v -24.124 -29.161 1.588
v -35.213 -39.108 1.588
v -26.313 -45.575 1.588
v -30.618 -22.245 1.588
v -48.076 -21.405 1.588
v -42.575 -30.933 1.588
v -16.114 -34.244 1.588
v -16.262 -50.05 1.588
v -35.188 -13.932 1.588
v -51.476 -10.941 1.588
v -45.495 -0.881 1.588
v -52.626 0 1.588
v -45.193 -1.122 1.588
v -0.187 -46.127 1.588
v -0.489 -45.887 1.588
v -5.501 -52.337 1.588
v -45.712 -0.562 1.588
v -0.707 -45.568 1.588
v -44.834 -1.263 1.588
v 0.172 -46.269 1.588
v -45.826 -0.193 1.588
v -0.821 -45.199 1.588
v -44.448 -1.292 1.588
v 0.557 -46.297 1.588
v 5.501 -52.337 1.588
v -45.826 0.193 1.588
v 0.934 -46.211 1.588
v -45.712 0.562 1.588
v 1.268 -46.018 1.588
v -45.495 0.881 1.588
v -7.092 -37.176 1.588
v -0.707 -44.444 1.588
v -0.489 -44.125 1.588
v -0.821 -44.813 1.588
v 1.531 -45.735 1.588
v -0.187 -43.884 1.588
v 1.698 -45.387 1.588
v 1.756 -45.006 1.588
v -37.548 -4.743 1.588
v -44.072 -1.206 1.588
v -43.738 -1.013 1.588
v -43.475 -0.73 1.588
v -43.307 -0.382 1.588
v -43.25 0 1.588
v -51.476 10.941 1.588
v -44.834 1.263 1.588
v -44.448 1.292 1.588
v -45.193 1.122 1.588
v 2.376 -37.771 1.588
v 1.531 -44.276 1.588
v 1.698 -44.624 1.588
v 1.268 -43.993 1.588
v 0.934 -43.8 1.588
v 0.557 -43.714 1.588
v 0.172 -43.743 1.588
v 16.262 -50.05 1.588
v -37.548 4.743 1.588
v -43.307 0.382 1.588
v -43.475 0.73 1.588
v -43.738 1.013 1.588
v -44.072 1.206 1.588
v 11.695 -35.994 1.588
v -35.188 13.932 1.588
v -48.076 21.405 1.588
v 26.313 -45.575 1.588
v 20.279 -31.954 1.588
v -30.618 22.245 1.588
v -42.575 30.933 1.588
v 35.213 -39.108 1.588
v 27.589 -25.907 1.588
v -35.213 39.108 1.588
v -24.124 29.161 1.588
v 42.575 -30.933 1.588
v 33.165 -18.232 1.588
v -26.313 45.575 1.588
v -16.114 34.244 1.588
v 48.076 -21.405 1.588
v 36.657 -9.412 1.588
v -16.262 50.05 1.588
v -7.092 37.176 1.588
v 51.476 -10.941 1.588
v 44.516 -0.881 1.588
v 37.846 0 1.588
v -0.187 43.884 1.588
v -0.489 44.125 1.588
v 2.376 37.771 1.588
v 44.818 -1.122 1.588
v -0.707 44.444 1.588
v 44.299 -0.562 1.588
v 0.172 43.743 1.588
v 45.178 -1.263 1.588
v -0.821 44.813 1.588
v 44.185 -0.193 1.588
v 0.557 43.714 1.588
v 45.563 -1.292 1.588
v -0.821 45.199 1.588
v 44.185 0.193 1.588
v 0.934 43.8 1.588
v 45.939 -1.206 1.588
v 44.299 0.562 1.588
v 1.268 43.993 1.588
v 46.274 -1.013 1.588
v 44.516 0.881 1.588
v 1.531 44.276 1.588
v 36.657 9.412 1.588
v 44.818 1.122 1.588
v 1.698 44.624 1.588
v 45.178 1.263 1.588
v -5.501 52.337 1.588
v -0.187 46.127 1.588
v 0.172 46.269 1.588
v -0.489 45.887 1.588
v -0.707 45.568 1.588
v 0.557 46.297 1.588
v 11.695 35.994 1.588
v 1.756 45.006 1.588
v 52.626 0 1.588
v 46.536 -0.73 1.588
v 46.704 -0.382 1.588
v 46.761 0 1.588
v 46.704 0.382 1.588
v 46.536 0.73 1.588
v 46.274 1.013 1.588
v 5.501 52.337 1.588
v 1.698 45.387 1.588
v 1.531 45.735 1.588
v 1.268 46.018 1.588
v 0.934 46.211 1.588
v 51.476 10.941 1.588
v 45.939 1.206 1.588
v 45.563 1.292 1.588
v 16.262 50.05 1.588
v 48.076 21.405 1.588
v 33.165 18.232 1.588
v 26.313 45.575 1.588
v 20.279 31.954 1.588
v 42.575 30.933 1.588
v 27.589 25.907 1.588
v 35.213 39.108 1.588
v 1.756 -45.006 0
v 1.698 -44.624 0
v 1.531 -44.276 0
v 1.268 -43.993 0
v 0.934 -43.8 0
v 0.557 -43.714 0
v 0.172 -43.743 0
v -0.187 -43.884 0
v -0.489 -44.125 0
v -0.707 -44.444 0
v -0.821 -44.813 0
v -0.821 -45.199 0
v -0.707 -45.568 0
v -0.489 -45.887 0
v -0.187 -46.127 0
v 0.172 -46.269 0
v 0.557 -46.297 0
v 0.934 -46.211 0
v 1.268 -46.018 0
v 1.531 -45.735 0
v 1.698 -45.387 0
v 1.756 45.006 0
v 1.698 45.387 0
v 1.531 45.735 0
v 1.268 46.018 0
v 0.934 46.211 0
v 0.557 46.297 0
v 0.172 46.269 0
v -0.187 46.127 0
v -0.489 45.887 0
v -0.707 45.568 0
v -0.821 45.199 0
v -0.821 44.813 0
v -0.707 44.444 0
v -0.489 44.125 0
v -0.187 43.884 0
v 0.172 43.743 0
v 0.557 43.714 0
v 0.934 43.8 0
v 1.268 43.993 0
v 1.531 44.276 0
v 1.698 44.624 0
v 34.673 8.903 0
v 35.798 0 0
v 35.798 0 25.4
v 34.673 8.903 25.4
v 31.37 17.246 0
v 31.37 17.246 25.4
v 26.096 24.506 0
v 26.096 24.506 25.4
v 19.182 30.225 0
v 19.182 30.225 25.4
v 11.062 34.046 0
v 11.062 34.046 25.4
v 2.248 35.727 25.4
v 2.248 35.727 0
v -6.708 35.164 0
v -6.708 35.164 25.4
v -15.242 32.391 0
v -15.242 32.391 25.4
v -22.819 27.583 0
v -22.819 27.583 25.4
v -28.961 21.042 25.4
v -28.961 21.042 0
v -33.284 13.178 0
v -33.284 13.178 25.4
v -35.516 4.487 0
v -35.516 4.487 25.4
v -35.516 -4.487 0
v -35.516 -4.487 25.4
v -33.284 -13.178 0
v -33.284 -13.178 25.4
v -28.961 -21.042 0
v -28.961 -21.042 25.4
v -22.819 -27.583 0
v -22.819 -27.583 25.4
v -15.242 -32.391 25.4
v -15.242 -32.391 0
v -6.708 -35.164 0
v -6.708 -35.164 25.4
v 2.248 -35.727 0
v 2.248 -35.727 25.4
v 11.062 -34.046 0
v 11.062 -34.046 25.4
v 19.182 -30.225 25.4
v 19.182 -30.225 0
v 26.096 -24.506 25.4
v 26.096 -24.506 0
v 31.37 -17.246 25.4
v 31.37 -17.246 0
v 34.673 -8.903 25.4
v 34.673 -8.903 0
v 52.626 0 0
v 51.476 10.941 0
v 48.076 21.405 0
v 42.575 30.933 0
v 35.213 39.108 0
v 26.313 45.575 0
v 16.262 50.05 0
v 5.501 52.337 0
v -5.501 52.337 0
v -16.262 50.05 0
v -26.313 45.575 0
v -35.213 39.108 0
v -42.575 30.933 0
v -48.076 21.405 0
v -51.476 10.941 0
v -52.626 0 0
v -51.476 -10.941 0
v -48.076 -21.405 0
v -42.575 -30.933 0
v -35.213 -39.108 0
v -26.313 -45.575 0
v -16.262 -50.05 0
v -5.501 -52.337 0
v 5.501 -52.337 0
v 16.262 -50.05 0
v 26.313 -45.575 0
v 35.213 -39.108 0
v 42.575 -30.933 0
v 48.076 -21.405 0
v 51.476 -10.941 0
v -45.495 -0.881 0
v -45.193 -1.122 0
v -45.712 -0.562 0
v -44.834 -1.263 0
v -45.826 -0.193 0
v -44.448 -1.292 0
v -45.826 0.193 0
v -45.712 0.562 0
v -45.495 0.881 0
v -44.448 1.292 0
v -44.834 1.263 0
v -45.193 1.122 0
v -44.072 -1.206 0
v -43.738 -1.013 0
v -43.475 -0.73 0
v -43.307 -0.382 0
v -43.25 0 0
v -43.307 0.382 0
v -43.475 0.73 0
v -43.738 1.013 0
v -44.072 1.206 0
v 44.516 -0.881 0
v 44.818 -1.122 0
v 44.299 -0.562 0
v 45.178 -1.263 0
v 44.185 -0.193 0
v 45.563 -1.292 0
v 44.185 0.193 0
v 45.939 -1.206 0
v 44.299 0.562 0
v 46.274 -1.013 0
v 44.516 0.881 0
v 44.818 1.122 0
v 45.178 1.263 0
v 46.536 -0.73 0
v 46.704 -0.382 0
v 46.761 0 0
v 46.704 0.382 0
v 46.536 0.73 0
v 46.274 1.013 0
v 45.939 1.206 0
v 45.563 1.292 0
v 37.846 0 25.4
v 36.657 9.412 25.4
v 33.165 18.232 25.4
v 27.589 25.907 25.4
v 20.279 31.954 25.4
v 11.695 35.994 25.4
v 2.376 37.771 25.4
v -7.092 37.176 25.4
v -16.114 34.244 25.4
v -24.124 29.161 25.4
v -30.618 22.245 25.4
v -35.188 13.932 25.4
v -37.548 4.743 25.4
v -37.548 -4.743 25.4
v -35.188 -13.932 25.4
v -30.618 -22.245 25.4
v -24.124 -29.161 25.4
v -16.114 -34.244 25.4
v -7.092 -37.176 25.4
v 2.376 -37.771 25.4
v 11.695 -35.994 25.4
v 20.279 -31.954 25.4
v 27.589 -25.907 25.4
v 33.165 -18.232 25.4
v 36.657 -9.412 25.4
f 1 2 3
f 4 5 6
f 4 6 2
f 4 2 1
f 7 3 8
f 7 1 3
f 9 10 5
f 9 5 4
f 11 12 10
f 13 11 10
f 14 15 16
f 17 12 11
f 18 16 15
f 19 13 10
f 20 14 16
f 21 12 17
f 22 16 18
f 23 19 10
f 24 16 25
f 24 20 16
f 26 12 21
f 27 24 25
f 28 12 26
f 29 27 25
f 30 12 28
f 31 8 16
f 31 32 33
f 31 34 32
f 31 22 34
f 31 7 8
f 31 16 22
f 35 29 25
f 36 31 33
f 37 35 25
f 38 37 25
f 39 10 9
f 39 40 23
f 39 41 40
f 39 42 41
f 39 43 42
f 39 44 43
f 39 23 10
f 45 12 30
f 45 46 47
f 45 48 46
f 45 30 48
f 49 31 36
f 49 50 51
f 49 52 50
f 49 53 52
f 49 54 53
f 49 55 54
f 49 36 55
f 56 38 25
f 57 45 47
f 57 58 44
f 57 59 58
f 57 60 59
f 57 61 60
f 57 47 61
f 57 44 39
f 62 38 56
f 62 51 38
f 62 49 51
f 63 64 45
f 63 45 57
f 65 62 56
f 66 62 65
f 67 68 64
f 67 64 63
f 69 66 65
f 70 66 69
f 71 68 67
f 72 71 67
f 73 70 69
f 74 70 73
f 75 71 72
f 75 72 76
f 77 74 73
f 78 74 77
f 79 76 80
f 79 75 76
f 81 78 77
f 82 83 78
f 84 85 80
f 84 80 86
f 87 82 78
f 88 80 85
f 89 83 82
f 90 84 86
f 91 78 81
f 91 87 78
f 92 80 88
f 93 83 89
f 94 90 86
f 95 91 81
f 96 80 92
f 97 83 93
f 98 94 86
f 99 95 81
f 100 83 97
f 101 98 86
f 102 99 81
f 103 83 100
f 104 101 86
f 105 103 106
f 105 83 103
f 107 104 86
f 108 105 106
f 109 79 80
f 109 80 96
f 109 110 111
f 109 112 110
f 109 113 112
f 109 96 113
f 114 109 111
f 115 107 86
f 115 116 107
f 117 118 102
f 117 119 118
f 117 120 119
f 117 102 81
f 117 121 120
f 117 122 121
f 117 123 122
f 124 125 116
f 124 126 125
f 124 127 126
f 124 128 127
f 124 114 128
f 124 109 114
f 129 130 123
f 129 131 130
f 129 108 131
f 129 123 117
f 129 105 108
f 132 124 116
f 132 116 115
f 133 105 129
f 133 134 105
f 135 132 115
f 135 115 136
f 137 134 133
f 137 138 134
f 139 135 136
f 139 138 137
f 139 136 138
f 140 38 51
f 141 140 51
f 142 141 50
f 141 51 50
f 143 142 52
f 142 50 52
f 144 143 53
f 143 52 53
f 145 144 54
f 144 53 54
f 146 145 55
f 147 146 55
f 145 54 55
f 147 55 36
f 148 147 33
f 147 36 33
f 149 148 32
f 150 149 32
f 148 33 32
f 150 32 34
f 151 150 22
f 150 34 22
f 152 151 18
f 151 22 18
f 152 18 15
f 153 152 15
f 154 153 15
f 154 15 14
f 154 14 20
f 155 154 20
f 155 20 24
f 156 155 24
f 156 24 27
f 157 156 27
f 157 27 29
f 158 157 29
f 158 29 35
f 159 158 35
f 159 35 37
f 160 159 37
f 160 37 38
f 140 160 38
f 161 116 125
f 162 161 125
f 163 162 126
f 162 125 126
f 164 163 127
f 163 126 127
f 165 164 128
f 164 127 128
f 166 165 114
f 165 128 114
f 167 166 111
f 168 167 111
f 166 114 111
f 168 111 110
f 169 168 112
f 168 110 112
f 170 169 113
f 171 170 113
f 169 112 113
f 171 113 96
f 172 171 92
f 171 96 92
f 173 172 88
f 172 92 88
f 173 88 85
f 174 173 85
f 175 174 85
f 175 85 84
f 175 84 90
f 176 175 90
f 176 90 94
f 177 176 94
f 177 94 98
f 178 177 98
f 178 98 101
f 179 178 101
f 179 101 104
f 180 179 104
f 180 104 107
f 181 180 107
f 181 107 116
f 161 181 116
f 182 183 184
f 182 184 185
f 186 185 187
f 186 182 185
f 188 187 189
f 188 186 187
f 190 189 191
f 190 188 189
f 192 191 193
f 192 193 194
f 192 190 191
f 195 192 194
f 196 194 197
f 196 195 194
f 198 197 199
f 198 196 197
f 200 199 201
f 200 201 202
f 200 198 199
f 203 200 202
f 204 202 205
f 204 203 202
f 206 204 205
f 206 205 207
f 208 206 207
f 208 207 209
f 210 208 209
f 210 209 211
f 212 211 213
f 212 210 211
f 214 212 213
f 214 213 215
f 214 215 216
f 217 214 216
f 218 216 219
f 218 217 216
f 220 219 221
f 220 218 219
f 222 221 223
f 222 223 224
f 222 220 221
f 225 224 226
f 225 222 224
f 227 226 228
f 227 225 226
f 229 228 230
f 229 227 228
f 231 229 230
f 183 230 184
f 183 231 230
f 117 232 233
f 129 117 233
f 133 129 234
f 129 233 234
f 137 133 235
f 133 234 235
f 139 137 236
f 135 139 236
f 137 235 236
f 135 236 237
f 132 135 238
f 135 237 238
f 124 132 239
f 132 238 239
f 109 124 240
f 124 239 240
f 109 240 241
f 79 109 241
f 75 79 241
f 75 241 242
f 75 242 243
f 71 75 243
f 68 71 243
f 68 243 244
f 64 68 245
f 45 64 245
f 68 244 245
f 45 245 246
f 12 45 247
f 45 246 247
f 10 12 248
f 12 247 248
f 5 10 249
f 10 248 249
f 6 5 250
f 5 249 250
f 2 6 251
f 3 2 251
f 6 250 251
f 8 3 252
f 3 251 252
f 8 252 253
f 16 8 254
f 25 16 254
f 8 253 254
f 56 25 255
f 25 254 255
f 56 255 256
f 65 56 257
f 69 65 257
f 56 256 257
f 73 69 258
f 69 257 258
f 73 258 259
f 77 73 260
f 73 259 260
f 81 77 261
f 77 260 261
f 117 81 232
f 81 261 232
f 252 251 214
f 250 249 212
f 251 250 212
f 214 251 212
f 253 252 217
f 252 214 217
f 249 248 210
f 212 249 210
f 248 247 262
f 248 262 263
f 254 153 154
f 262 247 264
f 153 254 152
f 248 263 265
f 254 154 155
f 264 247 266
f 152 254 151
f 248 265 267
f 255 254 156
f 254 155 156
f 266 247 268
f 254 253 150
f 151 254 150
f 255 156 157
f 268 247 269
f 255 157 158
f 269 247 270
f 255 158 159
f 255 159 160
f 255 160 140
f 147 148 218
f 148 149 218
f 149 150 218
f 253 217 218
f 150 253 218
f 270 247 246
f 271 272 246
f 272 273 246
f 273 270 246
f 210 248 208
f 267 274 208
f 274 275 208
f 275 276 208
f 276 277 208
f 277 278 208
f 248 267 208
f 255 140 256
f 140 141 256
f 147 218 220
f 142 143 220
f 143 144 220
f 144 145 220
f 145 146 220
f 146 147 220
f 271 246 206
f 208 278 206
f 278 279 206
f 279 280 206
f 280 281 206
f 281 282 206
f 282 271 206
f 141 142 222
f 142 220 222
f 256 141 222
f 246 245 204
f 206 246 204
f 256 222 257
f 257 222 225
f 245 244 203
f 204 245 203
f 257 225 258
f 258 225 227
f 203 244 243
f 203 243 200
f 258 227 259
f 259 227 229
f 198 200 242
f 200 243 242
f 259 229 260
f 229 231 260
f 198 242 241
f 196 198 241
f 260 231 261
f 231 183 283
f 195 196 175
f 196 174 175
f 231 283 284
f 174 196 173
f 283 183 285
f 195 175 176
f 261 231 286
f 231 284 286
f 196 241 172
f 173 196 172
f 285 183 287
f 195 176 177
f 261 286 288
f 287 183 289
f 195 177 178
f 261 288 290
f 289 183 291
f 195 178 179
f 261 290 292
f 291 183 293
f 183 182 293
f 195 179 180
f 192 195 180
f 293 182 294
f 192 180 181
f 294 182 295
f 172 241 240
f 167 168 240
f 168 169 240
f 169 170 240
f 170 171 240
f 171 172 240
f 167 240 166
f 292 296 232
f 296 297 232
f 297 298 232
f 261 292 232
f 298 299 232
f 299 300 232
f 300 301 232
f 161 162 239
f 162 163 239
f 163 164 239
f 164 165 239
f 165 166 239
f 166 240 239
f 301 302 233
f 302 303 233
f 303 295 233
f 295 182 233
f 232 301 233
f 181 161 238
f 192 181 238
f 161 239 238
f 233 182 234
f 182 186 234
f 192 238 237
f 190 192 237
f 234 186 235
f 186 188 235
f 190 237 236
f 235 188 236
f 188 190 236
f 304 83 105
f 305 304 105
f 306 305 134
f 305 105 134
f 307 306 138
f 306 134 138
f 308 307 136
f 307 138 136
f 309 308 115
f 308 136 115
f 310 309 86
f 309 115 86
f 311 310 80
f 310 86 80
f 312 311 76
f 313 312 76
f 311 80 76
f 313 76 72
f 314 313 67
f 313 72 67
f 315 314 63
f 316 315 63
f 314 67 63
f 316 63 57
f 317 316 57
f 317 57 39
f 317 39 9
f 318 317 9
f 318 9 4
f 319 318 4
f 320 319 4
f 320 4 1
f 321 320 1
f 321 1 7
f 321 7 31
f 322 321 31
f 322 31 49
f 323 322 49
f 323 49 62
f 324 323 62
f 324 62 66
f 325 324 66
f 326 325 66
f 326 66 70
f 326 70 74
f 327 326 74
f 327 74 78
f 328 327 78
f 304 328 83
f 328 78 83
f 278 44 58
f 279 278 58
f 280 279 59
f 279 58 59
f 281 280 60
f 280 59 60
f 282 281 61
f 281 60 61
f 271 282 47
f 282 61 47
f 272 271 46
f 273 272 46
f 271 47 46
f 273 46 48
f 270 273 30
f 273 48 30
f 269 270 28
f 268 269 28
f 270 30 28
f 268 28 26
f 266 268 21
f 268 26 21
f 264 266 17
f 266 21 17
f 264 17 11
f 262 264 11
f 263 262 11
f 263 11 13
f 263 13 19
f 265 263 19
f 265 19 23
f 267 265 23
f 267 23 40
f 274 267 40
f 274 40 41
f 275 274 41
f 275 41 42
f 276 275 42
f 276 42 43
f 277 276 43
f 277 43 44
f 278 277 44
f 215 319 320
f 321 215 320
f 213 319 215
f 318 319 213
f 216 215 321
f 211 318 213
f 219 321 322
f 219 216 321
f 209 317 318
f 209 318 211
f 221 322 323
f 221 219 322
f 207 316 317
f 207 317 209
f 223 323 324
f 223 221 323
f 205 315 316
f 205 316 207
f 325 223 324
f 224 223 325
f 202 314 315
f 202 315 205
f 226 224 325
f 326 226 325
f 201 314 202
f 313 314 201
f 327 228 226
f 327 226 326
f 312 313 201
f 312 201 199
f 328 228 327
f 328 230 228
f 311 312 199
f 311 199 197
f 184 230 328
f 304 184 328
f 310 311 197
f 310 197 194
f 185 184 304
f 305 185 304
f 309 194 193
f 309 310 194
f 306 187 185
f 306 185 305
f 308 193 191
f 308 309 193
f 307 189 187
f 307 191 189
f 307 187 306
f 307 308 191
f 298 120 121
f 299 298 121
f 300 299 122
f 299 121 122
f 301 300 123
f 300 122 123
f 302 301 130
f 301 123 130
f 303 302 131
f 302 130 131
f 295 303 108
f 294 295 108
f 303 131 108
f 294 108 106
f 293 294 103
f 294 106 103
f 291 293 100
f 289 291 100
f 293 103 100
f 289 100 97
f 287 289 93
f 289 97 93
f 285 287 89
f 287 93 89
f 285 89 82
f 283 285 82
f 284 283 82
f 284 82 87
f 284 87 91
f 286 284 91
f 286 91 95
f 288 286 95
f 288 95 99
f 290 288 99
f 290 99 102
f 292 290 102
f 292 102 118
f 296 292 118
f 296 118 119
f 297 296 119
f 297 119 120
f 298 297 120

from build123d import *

# Parameters (mm, degrees)
F0_R     = 37.846
F1_DEPTH = 25.4
F2_R     = 52.625625
F3_DEPTH = 1.5875
F4_R     = 35.798125
F5_DEPTH = 25.4
F6_R     = 1.2954
F7_DEPTH = 1.5885


with BuildPart() as f1:
    # F0 (on Top) → F1 (new body)
    with BuildSketch(Plane.XY):
        Circle(F0_R)
    extrude(amount=F1_DEPTH)

    # F2 (on Top) → F3 (join)
    with BuildSketch(Plane.XY):
        Circle(F2_R)
    extrude(amount=F3_DEPTH)

    # F4 (on Top) → F5 (cut, through all)
    with BuildSketch(Plane.XY):
        Circle(F4_R)
    extrude(amount=F5_DEPTH, mode=Mode.SUBTRACT)

    # F6 (on face) → F7 (cut, through all)
    with BuildSketch(Plane.XY.offset(1.5875)):
        with Locations((45.466, 0)):
            Circle(F6_R)
        with Locations((0.460375, -45.005625)):
            Circle(F6_R)
        with Locations((-44.54525, 0)):
            Circle(F6_R)
        with Locations((0.460375, 45.005625)):
            Circle(F6_R)
    extrude(amount=-F7_DEPTH, mode=Mode.SUBTRACT)


solid = f1.part
